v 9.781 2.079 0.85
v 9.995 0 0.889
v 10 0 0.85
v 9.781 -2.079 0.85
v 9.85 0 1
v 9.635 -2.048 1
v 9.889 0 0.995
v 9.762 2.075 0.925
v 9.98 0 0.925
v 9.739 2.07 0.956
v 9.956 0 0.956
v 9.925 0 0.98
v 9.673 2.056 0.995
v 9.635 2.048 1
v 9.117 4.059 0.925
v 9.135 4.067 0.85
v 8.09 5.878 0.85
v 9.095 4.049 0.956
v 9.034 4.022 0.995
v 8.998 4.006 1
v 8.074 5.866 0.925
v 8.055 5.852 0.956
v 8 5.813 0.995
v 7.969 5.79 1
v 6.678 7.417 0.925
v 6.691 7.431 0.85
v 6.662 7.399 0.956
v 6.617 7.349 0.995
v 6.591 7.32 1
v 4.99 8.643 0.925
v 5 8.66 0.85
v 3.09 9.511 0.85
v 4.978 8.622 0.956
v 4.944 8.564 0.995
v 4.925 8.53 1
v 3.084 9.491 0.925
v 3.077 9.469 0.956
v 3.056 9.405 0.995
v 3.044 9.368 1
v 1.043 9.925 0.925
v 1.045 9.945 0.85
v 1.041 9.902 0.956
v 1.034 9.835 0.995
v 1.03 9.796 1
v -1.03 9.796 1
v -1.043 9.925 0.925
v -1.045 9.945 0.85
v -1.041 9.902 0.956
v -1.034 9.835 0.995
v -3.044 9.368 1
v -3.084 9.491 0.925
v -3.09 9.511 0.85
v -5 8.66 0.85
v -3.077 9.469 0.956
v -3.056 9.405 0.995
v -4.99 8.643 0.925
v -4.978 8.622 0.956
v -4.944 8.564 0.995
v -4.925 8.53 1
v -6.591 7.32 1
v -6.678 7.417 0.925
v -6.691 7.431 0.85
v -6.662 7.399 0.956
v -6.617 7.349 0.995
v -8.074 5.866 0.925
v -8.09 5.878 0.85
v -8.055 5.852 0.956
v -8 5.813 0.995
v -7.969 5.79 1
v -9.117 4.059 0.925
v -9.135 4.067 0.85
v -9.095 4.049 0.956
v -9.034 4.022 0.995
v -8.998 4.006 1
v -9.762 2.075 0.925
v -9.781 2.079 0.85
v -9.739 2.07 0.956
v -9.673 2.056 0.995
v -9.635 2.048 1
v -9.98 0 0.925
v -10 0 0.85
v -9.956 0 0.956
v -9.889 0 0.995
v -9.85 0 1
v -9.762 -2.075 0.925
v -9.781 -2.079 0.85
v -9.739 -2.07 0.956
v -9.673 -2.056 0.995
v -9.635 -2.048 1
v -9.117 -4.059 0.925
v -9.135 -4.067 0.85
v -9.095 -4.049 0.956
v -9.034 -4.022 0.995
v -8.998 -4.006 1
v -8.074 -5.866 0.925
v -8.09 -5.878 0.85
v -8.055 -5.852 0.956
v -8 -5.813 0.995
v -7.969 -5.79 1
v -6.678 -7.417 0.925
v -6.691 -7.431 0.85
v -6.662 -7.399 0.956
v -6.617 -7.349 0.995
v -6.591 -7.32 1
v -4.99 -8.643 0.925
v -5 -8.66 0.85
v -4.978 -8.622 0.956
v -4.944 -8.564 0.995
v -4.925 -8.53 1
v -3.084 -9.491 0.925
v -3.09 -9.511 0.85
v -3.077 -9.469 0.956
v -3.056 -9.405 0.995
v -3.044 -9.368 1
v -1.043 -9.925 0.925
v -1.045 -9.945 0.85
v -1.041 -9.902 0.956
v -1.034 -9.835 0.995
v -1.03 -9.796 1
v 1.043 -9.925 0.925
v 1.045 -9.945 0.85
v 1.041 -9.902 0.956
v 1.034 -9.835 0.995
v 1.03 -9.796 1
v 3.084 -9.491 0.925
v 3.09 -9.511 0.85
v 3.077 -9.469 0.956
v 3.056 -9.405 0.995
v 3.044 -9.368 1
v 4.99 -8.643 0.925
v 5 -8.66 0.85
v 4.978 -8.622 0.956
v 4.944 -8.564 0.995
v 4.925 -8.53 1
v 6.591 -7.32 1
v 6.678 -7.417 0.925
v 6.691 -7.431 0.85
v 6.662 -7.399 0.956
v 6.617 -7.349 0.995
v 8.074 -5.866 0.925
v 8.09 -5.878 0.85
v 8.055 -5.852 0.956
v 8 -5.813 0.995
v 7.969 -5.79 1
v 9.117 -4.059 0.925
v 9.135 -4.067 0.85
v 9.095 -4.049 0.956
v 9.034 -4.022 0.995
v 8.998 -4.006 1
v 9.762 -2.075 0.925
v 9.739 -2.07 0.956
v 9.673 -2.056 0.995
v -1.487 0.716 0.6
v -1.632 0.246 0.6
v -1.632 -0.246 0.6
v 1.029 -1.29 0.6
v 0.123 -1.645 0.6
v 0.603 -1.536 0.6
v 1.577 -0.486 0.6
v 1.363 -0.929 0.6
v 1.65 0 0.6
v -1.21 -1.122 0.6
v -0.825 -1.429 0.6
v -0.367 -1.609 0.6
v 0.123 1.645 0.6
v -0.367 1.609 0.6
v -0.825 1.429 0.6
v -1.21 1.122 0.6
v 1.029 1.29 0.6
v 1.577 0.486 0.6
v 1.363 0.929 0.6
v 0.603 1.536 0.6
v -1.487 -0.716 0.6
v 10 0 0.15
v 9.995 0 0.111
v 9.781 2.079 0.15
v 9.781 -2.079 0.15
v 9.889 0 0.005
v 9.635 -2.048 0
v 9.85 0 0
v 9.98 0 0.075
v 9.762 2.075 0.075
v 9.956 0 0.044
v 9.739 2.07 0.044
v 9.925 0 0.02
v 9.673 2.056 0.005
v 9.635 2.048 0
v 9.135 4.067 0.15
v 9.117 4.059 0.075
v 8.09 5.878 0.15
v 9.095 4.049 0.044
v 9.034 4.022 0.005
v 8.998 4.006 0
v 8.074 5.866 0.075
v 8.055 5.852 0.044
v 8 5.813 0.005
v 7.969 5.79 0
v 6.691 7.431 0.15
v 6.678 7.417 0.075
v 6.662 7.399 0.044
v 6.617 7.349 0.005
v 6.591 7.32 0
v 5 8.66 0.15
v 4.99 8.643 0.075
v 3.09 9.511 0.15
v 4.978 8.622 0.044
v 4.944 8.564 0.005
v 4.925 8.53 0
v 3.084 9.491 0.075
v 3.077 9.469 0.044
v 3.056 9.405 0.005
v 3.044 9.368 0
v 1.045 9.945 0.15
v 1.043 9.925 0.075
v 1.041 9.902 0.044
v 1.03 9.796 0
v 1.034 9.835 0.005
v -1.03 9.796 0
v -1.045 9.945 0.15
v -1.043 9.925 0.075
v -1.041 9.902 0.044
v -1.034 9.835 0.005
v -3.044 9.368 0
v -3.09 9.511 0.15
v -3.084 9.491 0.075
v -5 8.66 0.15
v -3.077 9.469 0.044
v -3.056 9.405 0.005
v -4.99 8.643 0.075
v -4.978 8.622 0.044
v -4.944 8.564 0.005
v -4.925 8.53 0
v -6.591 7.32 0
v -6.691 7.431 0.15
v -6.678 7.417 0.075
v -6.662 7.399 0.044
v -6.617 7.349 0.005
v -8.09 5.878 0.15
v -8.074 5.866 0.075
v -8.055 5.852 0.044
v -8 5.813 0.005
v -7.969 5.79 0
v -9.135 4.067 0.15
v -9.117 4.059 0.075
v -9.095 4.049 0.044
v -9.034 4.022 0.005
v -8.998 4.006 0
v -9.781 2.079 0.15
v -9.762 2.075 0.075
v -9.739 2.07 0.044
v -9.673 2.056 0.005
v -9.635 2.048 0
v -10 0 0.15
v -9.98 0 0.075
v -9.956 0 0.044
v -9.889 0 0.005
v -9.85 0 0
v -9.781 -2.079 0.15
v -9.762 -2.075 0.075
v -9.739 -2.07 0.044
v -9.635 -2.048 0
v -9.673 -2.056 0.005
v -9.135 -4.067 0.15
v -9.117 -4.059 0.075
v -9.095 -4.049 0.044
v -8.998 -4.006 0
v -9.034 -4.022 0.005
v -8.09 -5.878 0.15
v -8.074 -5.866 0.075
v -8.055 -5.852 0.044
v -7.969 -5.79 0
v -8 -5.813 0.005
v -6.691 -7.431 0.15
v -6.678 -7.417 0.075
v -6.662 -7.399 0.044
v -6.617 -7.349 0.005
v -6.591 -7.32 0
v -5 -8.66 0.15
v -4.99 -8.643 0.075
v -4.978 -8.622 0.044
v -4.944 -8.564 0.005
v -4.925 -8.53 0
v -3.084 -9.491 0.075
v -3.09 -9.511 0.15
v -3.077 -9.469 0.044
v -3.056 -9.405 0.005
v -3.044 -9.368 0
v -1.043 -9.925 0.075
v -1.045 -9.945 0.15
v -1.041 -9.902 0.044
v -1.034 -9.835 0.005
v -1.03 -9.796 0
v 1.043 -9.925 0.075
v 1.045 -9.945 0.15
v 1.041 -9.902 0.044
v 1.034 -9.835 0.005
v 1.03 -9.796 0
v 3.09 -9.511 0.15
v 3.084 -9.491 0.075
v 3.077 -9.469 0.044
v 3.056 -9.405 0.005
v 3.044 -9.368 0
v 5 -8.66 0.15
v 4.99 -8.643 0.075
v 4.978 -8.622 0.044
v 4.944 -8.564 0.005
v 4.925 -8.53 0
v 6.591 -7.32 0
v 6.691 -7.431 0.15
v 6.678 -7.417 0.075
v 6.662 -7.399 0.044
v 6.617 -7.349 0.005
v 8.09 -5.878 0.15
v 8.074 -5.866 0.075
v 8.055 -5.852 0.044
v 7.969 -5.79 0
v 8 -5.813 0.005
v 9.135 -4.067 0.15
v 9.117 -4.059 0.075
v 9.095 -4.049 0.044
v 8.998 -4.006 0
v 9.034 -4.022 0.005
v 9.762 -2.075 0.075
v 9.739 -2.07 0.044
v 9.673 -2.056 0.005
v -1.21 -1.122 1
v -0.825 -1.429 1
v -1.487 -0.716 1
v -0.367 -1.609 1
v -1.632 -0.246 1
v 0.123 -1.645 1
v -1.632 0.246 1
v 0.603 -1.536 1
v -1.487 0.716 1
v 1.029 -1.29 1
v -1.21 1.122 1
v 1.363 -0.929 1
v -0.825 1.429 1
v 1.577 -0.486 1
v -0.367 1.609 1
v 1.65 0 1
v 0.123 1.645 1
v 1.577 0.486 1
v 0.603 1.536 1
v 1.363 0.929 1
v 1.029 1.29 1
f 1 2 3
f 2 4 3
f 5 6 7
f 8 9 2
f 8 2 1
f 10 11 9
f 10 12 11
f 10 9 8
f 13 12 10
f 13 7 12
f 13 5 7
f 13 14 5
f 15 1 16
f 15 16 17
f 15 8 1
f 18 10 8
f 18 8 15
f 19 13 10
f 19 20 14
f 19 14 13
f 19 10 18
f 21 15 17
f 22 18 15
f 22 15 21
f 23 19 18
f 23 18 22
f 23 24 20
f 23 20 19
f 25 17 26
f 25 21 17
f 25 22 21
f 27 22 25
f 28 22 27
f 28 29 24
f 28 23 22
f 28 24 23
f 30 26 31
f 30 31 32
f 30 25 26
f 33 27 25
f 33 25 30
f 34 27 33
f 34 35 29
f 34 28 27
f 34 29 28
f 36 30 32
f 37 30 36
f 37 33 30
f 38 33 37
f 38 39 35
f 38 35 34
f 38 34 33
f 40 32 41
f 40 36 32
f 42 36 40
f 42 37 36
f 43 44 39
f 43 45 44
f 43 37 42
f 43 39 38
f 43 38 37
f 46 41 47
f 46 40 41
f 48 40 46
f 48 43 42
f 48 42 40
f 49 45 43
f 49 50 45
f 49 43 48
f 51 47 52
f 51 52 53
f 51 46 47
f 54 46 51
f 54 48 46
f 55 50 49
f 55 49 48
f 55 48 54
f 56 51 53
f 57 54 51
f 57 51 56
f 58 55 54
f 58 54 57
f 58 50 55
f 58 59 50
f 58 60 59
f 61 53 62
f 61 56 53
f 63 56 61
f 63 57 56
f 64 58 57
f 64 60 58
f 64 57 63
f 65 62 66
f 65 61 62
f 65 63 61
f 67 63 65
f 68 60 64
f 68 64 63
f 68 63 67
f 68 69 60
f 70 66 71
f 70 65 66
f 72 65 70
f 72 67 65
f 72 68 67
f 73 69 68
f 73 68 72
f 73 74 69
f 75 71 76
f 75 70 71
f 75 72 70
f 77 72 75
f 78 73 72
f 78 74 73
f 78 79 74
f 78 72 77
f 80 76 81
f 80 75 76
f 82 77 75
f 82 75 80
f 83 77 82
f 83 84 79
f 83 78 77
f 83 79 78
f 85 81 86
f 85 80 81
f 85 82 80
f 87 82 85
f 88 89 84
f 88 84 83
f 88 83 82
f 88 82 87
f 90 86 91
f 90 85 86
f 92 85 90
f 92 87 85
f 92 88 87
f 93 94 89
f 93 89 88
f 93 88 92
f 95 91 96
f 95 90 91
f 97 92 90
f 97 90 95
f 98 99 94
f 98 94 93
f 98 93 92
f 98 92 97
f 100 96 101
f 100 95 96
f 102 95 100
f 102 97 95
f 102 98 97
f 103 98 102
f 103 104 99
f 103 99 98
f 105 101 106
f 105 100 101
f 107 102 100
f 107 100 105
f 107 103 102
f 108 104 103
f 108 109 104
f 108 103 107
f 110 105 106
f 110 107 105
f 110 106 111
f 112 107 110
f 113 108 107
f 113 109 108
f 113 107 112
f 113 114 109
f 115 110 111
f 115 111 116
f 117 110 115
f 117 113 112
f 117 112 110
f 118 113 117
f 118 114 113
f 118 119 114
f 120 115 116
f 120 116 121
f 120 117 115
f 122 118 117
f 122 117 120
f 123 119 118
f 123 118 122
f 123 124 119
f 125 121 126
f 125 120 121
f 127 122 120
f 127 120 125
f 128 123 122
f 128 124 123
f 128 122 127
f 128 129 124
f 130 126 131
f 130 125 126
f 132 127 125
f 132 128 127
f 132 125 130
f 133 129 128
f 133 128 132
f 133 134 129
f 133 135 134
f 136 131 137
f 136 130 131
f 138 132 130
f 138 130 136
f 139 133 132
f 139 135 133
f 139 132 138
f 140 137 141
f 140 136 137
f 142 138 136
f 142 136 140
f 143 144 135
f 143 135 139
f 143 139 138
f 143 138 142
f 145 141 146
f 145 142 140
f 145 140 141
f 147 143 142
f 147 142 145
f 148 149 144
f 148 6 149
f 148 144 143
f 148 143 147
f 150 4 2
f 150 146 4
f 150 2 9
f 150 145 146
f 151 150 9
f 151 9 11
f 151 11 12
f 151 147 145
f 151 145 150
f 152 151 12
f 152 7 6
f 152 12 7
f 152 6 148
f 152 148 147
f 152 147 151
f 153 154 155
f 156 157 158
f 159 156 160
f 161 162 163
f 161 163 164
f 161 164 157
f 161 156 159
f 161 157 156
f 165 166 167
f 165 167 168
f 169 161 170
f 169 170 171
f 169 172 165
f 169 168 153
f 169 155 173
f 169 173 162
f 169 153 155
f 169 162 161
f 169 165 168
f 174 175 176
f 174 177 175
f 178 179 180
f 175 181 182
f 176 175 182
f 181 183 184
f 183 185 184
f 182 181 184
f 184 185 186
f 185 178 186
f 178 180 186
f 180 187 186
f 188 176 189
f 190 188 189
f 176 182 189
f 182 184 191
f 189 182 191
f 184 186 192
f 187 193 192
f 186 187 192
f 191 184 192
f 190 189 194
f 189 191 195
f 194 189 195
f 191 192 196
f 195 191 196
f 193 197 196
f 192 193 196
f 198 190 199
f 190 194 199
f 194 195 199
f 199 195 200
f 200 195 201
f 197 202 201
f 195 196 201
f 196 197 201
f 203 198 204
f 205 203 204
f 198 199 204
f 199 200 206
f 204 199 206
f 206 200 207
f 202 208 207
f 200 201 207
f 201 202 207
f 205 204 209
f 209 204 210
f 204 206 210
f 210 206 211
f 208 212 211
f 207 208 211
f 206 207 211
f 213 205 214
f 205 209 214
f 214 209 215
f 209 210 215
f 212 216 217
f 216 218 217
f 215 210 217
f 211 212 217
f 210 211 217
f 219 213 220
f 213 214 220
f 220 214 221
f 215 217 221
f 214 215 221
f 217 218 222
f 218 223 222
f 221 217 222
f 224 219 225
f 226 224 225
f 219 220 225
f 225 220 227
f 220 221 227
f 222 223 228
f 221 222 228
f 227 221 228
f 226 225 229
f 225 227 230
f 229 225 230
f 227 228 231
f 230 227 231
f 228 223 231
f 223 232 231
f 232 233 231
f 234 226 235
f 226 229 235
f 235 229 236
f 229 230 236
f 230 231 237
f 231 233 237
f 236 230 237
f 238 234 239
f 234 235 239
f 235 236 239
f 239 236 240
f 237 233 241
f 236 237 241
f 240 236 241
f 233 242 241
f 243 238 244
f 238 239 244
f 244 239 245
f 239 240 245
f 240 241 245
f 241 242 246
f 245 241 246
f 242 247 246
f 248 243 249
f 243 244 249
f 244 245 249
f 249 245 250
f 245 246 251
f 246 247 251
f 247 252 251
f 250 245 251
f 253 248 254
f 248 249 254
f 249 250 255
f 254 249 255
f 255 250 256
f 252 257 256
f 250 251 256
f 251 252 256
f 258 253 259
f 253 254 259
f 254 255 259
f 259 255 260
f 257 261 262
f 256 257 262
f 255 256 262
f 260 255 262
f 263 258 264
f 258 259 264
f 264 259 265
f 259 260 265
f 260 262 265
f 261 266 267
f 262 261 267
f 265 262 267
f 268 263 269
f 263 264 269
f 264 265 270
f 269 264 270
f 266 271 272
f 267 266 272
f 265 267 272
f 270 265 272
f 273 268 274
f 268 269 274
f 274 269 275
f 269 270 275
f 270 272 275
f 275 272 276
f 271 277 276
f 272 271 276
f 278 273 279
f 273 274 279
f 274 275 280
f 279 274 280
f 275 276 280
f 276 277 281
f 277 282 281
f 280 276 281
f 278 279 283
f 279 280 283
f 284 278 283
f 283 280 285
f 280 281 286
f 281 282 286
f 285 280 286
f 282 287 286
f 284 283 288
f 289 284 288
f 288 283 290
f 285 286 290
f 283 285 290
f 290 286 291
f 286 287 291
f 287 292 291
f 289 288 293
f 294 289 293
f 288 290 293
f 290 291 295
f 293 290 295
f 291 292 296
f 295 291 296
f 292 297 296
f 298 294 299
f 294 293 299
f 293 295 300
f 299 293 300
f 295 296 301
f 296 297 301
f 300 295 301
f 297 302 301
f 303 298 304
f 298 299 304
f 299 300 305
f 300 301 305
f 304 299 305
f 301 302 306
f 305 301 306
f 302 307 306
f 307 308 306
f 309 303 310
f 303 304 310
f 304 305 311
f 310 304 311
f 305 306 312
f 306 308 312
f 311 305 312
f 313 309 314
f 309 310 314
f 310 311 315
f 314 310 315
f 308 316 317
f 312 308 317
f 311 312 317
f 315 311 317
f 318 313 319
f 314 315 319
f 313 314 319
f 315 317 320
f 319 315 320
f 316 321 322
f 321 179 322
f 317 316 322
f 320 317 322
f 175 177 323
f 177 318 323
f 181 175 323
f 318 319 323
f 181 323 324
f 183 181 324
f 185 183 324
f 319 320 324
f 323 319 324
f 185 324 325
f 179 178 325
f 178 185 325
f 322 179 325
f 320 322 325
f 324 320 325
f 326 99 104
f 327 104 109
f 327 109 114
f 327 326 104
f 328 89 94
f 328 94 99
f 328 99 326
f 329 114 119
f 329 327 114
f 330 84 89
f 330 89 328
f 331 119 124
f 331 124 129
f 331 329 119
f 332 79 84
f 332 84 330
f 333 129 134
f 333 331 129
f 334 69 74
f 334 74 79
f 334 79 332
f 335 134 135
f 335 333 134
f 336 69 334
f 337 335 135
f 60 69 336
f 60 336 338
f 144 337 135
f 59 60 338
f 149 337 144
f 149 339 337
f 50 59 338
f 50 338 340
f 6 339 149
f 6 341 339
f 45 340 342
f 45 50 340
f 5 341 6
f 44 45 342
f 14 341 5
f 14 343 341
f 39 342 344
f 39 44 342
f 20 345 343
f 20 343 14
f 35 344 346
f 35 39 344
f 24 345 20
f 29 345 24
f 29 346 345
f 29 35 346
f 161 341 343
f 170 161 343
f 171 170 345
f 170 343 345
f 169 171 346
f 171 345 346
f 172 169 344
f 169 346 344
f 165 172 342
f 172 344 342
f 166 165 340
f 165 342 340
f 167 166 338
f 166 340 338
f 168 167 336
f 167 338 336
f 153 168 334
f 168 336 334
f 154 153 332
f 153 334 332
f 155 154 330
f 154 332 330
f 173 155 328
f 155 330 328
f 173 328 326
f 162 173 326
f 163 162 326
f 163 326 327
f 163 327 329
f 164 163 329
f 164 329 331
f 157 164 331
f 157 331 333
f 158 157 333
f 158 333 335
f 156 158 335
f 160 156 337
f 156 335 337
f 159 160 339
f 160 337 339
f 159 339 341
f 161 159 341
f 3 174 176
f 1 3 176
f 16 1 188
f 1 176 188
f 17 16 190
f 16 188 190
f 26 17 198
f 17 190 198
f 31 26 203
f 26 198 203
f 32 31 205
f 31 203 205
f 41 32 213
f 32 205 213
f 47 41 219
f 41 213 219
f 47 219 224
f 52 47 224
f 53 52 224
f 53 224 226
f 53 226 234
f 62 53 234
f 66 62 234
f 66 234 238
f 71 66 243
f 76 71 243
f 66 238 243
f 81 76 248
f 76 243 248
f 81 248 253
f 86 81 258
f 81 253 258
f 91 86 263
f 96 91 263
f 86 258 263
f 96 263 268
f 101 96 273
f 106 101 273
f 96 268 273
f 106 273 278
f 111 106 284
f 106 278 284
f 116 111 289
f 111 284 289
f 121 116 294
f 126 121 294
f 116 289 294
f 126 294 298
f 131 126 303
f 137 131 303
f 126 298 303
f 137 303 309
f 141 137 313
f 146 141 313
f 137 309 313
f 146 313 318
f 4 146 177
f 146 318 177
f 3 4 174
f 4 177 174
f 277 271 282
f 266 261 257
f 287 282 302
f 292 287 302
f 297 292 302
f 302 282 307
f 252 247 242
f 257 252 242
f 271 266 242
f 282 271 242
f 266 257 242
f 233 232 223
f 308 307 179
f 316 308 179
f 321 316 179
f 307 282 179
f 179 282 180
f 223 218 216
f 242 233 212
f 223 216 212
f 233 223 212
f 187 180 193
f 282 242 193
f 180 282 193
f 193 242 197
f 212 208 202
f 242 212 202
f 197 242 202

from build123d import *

# Parameters (mm, degrees)
F0_R     = 10
F1_DEPTH = 1
F2_R     = 0.15
F3_R     = 1.65
F4_DEPTH = 0.4


# Not quite as in the source:
# - a feature names something its author has since deleted; it is built from what else it names


with BuildPart() as f1:
    # F0 (on Top) → F1 (new body)
    with BuildSketch(Plane.XY):
        Circle(F0_R)
    extrude(amount=F1_DEPTH)

    # F2
    f2_edges = [f1.edges().sort_by_distance(p)[0] for p in [
        (-10, 0, 1),
        (-10, 0, 0),
    ]]
    fillet(f2_edges, radius=F2_R)

    # F3 (on face) → F4 (cut)
    with BuildSketch(Plane.XY.offset(1)):
        Circle(F3_R)
    extrude(amount=-F4_DEPTH, mode=Mode.SUBTRACT)


solid = f1.part
